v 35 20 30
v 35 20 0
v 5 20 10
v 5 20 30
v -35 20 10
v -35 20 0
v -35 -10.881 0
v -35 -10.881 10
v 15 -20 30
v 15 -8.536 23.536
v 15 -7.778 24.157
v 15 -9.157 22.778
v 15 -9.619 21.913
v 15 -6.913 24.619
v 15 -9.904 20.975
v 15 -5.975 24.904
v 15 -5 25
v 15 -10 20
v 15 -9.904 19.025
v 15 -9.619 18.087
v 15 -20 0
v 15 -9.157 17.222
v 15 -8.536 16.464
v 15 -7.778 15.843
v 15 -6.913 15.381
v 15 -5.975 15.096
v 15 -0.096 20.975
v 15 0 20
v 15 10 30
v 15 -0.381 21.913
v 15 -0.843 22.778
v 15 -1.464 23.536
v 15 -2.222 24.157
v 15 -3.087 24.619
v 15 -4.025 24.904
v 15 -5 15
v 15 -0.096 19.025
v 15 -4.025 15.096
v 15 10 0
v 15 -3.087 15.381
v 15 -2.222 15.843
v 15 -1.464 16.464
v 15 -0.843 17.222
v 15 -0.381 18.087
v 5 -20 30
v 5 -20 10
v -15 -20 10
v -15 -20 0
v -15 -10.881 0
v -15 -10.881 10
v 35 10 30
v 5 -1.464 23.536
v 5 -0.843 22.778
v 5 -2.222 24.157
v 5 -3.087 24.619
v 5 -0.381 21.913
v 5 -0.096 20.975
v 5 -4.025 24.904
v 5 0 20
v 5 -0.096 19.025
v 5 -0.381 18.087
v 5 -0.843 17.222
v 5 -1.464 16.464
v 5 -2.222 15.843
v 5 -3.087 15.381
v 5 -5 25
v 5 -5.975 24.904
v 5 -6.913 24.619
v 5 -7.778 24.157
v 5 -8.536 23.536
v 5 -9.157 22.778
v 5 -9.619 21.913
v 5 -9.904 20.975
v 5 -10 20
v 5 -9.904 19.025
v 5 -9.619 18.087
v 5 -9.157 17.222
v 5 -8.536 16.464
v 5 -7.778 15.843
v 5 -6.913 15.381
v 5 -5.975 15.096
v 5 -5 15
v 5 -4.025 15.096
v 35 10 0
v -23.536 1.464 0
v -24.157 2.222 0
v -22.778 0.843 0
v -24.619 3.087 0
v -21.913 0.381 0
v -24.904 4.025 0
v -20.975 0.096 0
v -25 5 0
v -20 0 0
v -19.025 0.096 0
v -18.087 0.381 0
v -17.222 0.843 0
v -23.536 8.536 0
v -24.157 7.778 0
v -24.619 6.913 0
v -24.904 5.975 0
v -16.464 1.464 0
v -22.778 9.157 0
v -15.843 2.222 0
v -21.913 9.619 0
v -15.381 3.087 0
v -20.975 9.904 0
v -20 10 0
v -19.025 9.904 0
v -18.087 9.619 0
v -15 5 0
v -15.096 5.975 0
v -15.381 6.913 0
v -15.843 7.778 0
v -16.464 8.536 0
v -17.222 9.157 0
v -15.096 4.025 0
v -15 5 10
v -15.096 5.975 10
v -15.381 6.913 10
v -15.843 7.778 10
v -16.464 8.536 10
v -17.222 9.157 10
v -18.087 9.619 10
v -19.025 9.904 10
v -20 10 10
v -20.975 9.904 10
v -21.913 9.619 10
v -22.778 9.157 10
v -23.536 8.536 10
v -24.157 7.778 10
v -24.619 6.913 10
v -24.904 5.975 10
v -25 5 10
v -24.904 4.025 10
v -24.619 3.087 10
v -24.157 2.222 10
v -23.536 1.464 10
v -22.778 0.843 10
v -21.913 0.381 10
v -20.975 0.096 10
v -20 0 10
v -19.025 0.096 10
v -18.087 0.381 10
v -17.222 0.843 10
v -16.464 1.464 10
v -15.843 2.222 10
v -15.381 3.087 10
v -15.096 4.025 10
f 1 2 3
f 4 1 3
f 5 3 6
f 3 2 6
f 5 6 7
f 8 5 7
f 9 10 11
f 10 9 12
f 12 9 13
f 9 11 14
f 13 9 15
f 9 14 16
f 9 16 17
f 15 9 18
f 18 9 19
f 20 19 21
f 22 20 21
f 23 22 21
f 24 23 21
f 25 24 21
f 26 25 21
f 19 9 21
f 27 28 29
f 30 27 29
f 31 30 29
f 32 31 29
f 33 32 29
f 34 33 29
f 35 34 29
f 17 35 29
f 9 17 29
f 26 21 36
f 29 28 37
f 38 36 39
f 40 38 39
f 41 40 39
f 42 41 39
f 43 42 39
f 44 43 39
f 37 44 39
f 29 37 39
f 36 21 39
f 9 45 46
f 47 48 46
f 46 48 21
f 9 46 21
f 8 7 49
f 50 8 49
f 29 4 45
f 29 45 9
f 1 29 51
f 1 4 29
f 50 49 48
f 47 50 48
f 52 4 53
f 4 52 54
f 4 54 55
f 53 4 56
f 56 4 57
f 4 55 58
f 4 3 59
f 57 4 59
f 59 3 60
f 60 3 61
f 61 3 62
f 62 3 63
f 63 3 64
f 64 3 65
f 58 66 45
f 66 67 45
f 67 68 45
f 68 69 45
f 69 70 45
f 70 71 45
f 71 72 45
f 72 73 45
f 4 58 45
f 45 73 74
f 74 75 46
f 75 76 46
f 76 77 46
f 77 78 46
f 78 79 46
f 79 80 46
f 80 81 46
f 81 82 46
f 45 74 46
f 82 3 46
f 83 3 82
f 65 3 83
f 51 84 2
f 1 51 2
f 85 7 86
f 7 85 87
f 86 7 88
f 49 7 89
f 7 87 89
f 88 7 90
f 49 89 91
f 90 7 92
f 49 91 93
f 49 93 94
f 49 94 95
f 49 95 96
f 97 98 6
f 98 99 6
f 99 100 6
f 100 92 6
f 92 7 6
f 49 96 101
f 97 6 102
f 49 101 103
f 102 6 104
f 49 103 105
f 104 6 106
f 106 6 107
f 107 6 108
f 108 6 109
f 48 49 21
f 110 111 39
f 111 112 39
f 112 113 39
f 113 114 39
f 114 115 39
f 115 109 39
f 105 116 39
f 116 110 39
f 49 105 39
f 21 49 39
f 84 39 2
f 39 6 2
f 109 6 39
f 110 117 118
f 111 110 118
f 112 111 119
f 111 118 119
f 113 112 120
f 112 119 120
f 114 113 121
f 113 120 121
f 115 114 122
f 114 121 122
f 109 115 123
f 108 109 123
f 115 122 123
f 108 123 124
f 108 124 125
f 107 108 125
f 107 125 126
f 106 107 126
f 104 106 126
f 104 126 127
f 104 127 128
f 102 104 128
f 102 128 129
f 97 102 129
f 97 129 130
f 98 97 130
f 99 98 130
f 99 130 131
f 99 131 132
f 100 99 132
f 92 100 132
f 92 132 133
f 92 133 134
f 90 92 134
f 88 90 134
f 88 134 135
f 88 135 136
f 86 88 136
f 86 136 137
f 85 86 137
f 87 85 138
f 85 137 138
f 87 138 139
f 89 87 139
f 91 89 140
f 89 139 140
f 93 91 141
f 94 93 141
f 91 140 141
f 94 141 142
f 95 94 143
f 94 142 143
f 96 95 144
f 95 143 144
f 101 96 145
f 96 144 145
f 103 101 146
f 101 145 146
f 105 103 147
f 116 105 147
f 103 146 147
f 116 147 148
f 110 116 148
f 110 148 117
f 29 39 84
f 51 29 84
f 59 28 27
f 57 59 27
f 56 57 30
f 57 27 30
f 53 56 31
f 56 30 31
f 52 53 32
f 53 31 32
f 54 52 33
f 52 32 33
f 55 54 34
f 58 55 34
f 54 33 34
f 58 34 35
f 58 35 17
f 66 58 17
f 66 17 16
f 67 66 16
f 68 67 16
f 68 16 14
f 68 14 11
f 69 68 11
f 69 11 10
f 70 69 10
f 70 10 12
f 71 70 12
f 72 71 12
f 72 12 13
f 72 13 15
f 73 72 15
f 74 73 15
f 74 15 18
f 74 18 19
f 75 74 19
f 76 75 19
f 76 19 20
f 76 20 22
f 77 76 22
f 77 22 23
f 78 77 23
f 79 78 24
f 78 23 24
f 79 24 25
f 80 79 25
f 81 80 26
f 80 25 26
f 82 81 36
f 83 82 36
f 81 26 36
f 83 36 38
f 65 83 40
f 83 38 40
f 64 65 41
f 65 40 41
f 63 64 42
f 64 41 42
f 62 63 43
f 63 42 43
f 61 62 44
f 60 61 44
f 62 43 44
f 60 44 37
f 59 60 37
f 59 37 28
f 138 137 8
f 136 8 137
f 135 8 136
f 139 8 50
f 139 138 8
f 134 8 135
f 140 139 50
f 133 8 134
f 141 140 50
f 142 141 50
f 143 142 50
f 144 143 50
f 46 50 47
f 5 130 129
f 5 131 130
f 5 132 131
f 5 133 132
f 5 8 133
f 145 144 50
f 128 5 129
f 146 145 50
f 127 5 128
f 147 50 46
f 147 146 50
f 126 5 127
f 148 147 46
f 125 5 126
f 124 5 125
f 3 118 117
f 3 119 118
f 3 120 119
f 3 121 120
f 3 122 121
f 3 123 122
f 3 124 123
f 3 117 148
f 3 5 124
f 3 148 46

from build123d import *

# Parameters (mm, degrees)
F1_DEPTH = 10
F2_DEPTH = 30
F3_R     = 5
F4_DEPTH = 25
F5_R     = 5
F6_DEPTH = 25


with BuildPart() as f1:
    # F0 (on Top) → F1 (new body)
    with BuildSketch(Plane.XY):
        Polygon((5, -20), (5, 20), (-35, 20), (-35, -10.881234), (-15, -10.881234), (-15, -20), align=None)
    extrude(amount=F1_DEPTH)

    # F0 (on Top) → F2 (join)
    with BuildSketch(Plane.XY):
        Polygon((35, 10), (35, 20), (15, 20), (5, 20), (5, -20), (15, -20), (15, 10), align=None)
    extrude(amount=F2_DEPTH)

    # F3 (on face) → F4 (cut)
    with BuildSketch(Plane.YZ.offset(15)):
        with Locations((-5, 20)):
            Circle(F3_R)
    extrude(amount=-F4_DEPTH, mode=Mode.SUBTRACT)

    # F5 (on face) → F6 (cut)
    with BuildSketch(Plane.XY.offset(10)):
        with Locations((-20, 5)):
            Circle(F5_R)
    extrude(amount=-F6_DEPTH, mode=Mode.SUBTRACT)


solid = f1.part
